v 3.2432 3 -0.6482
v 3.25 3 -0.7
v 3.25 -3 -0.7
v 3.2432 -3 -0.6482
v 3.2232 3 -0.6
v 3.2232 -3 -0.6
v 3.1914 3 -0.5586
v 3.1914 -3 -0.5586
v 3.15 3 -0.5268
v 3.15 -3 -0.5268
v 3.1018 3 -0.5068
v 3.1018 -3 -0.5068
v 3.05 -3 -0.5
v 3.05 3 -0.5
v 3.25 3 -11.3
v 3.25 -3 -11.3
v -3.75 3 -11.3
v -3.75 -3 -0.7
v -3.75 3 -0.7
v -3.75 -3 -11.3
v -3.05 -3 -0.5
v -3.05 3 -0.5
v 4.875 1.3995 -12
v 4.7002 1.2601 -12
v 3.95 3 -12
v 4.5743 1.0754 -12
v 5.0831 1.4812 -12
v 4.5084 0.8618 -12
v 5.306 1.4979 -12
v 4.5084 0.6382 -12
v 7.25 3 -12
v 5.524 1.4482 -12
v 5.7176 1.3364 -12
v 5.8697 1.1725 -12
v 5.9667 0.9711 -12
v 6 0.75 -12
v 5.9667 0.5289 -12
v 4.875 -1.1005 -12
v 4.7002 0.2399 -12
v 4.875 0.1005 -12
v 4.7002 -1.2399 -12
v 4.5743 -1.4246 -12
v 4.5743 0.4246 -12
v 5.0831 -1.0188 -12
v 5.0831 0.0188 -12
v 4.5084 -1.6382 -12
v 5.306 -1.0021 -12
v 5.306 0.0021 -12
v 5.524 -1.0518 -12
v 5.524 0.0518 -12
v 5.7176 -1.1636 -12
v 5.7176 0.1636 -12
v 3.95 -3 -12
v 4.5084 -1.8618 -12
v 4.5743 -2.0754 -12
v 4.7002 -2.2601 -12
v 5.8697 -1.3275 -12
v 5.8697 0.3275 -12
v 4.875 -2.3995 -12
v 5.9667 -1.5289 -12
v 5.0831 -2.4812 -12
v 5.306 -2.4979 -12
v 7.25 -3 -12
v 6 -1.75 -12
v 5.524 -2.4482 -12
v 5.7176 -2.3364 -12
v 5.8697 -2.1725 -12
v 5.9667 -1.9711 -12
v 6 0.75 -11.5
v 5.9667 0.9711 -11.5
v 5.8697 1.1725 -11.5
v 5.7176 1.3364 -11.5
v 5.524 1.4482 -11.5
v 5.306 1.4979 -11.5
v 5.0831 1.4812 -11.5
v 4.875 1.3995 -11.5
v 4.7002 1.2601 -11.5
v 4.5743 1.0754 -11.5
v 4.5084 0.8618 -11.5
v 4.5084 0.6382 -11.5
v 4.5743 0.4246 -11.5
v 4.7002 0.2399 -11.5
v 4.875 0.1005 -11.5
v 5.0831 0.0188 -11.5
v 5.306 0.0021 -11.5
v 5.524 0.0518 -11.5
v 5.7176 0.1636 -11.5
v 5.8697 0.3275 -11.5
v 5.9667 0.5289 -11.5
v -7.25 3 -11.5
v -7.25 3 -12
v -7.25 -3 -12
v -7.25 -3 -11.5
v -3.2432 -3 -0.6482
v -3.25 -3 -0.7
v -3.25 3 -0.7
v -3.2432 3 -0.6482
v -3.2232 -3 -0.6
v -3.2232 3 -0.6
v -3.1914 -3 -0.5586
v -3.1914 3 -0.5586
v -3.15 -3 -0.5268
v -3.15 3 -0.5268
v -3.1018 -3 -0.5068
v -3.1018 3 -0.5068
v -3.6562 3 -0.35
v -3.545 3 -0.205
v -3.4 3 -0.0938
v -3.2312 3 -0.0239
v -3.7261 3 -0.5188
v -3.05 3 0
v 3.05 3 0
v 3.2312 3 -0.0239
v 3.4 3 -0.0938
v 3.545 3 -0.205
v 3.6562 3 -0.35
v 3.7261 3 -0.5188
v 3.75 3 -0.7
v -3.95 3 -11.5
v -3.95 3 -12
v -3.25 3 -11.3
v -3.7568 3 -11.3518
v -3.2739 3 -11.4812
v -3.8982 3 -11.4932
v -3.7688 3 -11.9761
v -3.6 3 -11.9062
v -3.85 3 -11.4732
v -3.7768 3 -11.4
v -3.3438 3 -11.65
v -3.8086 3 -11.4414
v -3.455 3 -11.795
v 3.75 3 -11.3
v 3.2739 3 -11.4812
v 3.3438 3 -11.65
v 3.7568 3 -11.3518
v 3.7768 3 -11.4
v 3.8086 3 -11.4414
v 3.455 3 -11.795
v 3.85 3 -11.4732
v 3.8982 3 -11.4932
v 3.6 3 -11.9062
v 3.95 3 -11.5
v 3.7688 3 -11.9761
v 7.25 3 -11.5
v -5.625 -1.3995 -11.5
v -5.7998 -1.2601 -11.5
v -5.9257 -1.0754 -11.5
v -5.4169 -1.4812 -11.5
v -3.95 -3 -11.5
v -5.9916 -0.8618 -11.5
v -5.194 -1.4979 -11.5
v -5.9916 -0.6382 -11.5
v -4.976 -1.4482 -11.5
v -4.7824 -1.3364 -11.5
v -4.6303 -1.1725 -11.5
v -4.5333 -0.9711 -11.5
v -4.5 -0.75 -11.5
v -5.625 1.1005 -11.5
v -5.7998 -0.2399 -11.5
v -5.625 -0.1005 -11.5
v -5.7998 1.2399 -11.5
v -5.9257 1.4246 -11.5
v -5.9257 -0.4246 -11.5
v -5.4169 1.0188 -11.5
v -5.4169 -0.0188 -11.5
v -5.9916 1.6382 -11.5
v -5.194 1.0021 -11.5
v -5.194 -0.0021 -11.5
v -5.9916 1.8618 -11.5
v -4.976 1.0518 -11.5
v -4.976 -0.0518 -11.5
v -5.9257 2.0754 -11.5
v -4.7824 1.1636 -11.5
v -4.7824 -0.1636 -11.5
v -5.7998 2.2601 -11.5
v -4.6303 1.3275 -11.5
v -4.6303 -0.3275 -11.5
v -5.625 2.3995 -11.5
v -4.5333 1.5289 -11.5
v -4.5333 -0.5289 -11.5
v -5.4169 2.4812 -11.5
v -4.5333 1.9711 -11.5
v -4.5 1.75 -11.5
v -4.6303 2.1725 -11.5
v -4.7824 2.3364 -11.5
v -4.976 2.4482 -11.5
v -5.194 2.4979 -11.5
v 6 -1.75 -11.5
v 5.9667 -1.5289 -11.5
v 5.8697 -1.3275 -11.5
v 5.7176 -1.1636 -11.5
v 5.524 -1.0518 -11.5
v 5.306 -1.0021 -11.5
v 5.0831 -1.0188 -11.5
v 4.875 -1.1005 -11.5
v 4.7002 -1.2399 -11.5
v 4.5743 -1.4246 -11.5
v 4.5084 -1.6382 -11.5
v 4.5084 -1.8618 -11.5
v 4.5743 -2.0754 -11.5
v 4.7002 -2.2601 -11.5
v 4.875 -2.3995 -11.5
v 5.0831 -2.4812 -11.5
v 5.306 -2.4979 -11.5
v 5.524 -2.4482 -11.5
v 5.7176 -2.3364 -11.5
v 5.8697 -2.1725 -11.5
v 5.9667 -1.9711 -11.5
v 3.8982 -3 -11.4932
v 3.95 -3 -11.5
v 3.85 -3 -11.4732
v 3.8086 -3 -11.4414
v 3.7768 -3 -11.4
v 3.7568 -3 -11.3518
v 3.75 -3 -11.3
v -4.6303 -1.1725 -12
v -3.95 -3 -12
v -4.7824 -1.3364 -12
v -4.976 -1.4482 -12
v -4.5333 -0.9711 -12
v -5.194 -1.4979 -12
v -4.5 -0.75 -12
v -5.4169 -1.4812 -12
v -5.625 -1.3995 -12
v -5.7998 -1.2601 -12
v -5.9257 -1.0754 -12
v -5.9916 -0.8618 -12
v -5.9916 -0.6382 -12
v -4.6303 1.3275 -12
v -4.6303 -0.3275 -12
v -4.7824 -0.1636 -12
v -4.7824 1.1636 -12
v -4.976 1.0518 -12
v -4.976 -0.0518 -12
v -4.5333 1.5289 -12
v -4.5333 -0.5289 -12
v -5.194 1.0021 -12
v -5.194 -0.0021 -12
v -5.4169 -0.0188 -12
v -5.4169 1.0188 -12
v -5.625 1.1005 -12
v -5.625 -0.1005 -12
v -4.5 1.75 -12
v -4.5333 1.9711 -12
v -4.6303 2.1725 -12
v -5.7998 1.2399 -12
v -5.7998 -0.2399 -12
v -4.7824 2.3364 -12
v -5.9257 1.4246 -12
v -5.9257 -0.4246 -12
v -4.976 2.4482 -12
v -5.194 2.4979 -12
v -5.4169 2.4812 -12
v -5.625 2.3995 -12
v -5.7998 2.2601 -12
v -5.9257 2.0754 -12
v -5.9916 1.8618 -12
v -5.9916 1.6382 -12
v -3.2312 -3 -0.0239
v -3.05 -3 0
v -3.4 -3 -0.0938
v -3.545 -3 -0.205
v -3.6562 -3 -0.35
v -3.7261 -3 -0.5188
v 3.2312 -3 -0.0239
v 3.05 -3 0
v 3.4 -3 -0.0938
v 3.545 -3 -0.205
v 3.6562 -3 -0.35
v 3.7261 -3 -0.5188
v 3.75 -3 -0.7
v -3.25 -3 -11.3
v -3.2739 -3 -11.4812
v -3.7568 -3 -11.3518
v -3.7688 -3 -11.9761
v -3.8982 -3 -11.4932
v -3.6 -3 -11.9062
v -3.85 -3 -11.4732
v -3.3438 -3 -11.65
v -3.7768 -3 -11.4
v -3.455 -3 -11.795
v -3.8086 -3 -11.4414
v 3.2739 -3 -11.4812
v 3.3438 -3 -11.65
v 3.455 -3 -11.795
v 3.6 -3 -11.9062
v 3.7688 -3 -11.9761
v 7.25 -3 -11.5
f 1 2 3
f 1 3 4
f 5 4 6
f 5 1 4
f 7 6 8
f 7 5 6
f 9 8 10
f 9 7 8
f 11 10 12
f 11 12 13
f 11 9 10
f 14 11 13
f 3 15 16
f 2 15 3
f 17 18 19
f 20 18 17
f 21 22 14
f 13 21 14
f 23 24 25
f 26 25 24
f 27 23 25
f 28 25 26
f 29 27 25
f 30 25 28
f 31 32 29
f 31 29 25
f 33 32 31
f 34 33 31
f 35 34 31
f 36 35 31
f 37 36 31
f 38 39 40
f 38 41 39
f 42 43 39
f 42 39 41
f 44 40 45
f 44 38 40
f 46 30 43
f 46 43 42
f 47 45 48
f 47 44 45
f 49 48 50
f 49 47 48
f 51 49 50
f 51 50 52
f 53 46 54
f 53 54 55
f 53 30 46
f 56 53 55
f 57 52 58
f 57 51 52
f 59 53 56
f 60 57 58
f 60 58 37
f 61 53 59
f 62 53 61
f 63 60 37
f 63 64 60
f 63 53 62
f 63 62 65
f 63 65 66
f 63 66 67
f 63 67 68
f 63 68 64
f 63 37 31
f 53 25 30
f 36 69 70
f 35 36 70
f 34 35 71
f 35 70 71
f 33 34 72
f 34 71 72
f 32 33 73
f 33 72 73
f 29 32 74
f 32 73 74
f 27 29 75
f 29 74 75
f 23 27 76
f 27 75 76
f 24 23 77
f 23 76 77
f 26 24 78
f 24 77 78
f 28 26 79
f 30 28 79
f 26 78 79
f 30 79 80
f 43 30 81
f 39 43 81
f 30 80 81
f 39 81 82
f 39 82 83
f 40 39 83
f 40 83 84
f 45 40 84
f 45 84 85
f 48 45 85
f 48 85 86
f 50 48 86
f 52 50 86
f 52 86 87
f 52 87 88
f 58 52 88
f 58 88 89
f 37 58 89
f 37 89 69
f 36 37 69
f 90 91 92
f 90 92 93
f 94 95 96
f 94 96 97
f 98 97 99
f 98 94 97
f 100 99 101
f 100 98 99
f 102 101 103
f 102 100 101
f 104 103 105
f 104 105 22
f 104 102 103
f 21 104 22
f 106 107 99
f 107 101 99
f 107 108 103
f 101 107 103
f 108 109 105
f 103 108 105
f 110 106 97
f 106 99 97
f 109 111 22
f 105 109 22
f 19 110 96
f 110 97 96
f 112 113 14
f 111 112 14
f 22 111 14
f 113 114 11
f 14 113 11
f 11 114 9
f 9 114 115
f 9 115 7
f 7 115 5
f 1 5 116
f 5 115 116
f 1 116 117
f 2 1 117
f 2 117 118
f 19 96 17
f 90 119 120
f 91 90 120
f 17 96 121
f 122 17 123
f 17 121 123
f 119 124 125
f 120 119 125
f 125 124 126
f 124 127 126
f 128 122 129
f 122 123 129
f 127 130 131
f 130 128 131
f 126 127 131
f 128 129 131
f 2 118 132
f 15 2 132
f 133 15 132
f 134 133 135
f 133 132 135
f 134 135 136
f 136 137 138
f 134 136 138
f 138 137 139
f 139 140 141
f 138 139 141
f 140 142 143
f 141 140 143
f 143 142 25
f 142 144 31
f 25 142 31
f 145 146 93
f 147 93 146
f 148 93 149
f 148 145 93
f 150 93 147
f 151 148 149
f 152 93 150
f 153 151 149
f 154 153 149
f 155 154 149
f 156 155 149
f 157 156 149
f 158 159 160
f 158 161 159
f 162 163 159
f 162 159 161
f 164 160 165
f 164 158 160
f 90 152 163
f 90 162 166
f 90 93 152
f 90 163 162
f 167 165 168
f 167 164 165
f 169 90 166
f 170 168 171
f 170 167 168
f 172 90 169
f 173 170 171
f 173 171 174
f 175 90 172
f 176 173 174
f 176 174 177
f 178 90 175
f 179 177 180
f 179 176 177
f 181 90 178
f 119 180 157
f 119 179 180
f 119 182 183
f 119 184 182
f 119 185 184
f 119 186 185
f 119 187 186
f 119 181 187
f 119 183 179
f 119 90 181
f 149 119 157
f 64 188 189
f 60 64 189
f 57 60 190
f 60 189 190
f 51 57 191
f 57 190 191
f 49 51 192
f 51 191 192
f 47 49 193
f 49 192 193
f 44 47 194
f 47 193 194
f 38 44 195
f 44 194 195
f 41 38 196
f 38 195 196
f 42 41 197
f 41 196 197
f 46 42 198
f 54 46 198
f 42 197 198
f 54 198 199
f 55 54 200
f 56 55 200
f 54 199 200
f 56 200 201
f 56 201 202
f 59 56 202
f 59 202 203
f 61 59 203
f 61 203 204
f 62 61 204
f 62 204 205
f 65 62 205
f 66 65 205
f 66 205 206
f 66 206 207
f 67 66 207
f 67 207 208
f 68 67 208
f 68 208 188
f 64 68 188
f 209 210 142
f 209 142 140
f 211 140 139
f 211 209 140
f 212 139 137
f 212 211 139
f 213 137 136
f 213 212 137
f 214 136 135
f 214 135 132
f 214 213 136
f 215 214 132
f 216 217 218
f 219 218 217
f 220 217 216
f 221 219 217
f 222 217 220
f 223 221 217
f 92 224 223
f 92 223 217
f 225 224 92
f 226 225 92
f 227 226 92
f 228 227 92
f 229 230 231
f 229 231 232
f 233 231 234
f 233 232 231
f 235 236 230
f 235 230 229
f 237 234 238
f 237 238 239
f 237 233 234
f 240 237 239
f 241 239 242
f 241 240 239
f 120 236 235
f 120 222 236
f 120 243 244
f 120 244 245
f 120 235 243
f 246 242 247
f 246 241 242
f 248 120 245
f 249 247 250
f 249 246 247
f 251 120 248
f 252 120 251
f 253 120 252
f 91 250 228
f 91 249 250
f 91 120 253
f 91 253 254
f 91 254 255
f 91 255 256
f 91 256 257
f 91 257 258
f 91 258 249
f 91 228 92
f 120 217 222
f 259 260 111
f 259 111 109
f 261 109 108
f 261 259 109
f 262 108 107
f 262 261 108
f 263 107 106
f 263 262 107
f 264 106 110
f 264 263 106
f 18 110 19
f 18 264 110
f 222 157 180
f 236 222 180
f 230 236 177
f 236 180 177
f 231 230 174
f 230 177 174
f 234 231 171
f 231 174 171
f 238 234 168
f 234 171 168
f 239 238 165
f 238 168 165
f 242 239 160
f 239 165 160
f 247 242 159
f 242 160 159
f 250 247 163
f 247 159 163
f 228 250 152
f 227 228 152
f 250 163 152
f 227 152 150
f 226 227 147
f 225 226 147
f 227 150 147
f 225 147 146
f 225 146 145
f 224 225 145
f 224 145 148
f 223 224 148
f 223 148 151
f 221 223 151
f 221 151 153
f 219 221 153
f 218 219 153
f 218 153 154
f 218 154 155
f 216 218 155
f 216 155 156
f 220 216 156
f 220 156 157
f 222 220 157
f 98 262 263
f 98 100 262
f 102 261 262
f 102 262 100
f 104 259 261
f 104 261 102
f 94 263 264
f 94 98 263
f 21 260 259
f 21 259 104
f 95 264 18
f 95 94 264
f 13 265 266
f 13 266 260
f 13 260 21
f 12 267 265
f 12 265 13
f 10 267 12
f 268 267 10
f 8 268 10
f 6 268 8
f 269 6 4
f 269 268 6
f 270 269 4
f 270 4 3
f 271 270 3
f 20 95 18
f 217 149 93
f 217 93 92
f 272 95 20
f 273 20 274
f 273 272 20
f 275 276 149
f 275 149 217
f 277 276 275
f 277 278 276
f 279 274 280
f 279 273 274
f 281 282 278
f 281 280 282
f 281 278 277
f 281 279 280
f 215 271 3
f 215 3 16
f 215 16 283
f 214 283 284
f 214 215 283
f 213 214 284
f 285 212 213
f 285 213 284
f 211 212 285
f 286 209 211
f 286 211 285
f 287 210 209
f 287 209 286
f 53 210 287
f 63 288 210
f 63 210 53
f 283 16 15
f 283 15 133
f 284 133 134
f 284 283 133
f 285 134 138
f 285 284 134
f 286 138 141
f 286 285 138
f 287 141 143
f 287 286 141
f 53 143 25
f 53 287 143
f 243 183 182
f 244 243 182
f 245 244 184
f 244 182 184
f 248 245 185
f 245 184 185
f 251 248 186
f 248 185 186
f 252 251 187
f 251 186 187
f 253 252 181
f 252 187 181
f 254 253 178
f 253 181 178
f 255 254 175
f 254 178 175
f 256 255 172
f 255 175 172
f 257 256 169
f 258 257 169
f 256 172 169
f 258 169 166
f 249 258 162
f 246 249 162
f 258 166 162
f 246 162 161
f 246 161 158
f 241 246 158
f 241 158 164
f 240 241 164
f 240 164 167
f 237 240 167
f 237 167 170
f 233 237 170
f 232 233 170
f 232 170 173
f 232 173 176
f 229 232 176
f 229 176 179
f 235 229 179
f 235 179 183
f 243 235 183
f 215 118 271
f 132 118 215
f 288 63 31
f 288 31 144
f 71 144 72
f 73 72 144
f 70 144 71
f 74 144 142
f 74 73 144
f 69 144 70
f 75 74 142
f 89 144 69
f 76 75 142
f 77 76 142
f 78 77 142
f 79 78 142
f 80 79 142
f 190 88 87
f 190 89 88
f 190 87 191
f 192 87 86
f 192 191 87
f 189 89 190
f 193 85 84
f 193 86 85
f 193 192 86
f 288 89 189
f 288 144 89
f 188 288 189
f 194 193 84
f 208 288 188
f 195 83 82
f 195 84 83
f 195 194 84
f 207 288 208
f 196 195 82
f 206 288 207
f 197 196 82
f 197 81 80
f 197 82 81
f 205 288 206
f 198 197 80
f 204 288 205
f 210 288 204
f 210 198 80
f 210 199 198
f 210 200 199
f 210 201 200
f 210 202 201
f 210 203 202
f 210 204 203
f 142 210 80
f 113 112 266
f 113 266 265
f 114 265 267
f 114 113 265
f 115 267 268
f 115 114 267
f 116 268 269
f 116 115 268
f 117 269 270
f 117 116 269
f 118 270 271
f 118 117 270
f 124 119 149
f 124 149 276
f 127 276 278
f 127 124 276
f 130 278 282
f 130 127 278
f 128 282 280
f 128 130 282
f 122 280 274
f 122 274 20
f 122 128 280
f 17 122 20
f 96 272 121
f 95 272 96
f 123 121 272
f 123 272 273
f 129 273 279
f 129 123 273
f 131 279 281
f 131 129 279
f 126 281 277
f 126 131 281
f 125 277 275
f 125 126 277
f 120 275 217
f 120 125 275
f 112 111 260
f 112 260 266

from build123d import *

# Parameters (mm, degrees)
SCHIZZO1_W                       = 6.5
SCHIZZO1_H                       = 6
BASE_FLANGIA1_DEPTH              = 0.5
BORDO_FLANGIA1_STRIP_W           = 2.4
BORDO_FLANGIA1_STRIP_H           = 0.5
BORDO_FLANGIA1_STRIP_CUT_DEPTH   = 6
BORDO_FLANGIA1_STRIP_2_W         = 2.4
BORDO_FLANGIA1_STRIP_2_H         = 0.5
BORDO_FLANGIA1_STRIP_CUT_2_DEPTH = 6
BORDO_FLANGIA1_DEPTH             = 6
BORDO_FLANGIA1_BEND_DEPTH        = 6
BORDO_FLANGIA2_STRIP_W           = 2.4
BORDO_FLANGIA2_STRIP_H           = 0.5
BORDO_FLANGIA2_STRIP_CUT_DEPTH   = 6
BORDO_FLANGIA2_STRIP_2_W         = 2.4
BORDO_FLANGIA2_STRIP_2_H         = 0.5
BORDO_FLANGIA2_STRIP_CUT_2_DEPTH = 6
BORDO_FLANGIA2_DEPTH             = 6
BORDO_FLANGIA2_BEND_DEPTH        = 6
SCHIZZO18_R                      = 0.75
TAGLIO_ESTRUSIONE1_DEPTH         = 14.921655792
SCHIZZO22_R                      = 0.75
TAGLIO_ESTRUSIONE2_DEPTH         = 14.921655792


# Sheet-metal steps are written as plain solids
with BuildPart() as part:
    # Schizzo1 → Base-Flangia1 (new body)
    with BuildSketch(Plane.XY):
        Rectangle(SCHIZZO1_W, SCHIZZO1_H)
    extrude(amount=-BASE_FLANGIA1_DEPTH)

    # Bordo-Flangia1 strip (across the edge) → Bordo-Flangia1 strip cut (cut)
    with BuildSketch(Plane(origin=(-3.25, -3, -0.5), x_dir=(1, 0, 0), z_dir=(0, 1, 0))):
        with Locations((-1, -0.25)):
            Rectangle(BORDO_FLANGIA1_STRIP_W, BORDO_FLANGIA1_STRIP_H)
    extrude(amount=BORDO_FLANGIA1_STRIP_CUT_DEPTH, mode=Mode.SUBTRACT)

    # Bordo-Flangia1 strip 2 (across the edge) → Bordo-Flangia1 strip cut 2 (cut)
    with BuildSketch(Plane(origin=(3.25, 3, -0.5), x_dir=(-1, 0, 0), z_dir=(0, -1, 0))):
        with Locations((-1, -0.25)):
            Rectangle(BORDO_FLANGIA1_STRIP_2_W, BORDO_FLANGIA1_STRIP_2_H)
    extrude(amount=BORDO_FLANGIA1_STRIP_CUT_2_DEPTH, mode=Mode.SUBTRACT)

    # Bordo-Flangia1 section (across the edge) → Bordo-Flangia1 (add)
    with BuildSketch(Plane(origin=(-3.25, -3, -0.5), x_dir=(1, 0, 0), z_dir=(0, 1, 0))):
        with BuildLine():
            Line((-0.5, 0.2), (-0.5, 11))
            Line((-0.5, 11), (0, 11))
            Line((0, 11), (0, 0.2))
            ThreePointArc((0, 0.2), (0.058578644, 0.058578644), (0.2, 0))
            Line((0.2, 0), (0.2, -0.5))
            ThreePointArc((0.2, -0.5), (-0.294974747, -0.294974747), (-0.5, 0.2))
        make_face()
    extrude(amount=BORDO_FLANGIA1_DEPTH)

    # Bordo-Flangia1 section 2 (across the edge) → Bordo-Flangia1 bend (add)
    with BuildSketch(Plane(origin=(3.25, 3, -0.5), x_dir=(-1, 0, 0), z_dir=(0, -1, 0))):
        with BuildLine():
            Line((-0.5, 0.2), (-0.5, 11))
            Line((-0.5, 11), (0, 11))
            Line((0, 11), (0, 0.2))
            ThreePointArc((0, 0.2), (0.058578644, 0.058578644), (0.2, 0))
            Line((0.2, 0), (0.2, -0.5))
            ThreePointArc((0.2, -0.5), (-0.294974747, -0.294974747), (-0.5, 0.2))
        make_face()
    extrude(amount=BORDO_FLANGIA1_BEND_DEPTH)

    # Bordo-Flangia2 strip (across the edge) → Bordo-Flangia2 strip cut (cut)
    with BuildSketch(Plane(origin=(-3.75, 3, -11.5), x_dir=(0, 0, 1), z_dir=(0, -1, 0))):
        with Locations((-1, -0.25)):
            Rectangle(BORDO_FLANGIA2_STRIP_W, BORDO_FLANGIA2_STRIP_H)
    extrude(amount=BORDO_FLANGIA2_STRIP_CUT_DEPTH, mode=Mode.SUBTRACT)

    # Bordo-Flangia2 strip 2 (across the edge) → Bordo-Flangia2 strip cut 2 (cut)
    with BuildSketch(Plane(origin=(3.75, -3, -11.5), x_dir=(0, 0, 1), z_dir=(0, 1, 0))):
        with Locations((-1, -0.25)):
            Rectangle(BORDO_FLANGIA2_STRIP_2_W, BORDO_FLANGIA2_STRIP_2_H)
    extrude(amount=BORDO_FLANGIA2_STRIP_CUT_2_DEPTH, mode=Mode.SUBTRACT)

    # Bordo-Flangia2 section (across the edge) → Bordo-Flangia2 (add)
    with BuildSketch(Plane(origin=(-3.75, 3, -11.5), x_dir=(0, 0, 1), z_dir=(0, -1, 0))):
        with BuildLine():
            Line((-0.5, 0.2), (-0.5, 3.5))
            Line((-0.5, 3.5), (0, 3.5))
            Line((0, 3.5), (0, 0.2))
            ThreePointArc((0, 0.2), (0.058578644, 0.058578644), (0.2, 0))
            Line((0.2, 0), (0.2, -0.5))
            ThreePointArc((0.2, -0.5), (-0.294974747, -0.294974747), (-0.5, 0.2))
        make_face()
    extrude(amount=BORDO_FLANGIA2_DEPTH)

    # Bordo-Flangia2 section 2 (across the edge) → Bordo-Flangia2 bend (add)
    with BuildSketch(Plane(origin=(3.75, -3, -11.5), x_dir=(0, 0, 1), z_dir=(0, 1, 0))):
        with BuildLine():
            Line((-0.5, 0.2), (-0.5, 3.5))
            Line((-0.5, 3.5), (0, 3.5))
            Line((0, 3.5), (0, 0.2))
            ThreePointArc((0, 0.2), (0.058578644, 0.058578644), (0.2, 0))
            Line((0.2, 0), (0.2, -0.5))
            ThreePointArc((0.2, -0.5), (-0.294974747, -0.294974747), (-0.5, 0.2))
        make_face()
    extrude(amount=BORDO_FLANGIA2_BEND_DEPTH)

    # Schizzo18 → Taglio-Estrusione1 (cut, through all)
    with BuildSketch(Plane.XY.offset(-11.5)):
        with Locations((5.25, 0.75)):
            Circle(SCHIZZO18_R)
        with Locations((5.25, -1.75)):
            Circle(SCHIZZO18_R)
    extrude(amount=-TAGLIO_ESTRUSIONE1_DEPTH, mode=Mode.SUBTRACT)

    # Schizzo22 → Taglio-Estrusione2 (cut, through all)
    with BuildSketch(Plane.XY.offset(-11.5)):
        with Locations((-5.25, 1.75)):
            Circle(SCHIZZO22_R)
        with Locations((-5.25, -0.75)):
            Circle(SCHIZZO22_R)
    extrude(amount=-TAGLIO_ESTRUSIONE2_DEPTH, mode=Mode.SUBTRACT)


solid = part.part
